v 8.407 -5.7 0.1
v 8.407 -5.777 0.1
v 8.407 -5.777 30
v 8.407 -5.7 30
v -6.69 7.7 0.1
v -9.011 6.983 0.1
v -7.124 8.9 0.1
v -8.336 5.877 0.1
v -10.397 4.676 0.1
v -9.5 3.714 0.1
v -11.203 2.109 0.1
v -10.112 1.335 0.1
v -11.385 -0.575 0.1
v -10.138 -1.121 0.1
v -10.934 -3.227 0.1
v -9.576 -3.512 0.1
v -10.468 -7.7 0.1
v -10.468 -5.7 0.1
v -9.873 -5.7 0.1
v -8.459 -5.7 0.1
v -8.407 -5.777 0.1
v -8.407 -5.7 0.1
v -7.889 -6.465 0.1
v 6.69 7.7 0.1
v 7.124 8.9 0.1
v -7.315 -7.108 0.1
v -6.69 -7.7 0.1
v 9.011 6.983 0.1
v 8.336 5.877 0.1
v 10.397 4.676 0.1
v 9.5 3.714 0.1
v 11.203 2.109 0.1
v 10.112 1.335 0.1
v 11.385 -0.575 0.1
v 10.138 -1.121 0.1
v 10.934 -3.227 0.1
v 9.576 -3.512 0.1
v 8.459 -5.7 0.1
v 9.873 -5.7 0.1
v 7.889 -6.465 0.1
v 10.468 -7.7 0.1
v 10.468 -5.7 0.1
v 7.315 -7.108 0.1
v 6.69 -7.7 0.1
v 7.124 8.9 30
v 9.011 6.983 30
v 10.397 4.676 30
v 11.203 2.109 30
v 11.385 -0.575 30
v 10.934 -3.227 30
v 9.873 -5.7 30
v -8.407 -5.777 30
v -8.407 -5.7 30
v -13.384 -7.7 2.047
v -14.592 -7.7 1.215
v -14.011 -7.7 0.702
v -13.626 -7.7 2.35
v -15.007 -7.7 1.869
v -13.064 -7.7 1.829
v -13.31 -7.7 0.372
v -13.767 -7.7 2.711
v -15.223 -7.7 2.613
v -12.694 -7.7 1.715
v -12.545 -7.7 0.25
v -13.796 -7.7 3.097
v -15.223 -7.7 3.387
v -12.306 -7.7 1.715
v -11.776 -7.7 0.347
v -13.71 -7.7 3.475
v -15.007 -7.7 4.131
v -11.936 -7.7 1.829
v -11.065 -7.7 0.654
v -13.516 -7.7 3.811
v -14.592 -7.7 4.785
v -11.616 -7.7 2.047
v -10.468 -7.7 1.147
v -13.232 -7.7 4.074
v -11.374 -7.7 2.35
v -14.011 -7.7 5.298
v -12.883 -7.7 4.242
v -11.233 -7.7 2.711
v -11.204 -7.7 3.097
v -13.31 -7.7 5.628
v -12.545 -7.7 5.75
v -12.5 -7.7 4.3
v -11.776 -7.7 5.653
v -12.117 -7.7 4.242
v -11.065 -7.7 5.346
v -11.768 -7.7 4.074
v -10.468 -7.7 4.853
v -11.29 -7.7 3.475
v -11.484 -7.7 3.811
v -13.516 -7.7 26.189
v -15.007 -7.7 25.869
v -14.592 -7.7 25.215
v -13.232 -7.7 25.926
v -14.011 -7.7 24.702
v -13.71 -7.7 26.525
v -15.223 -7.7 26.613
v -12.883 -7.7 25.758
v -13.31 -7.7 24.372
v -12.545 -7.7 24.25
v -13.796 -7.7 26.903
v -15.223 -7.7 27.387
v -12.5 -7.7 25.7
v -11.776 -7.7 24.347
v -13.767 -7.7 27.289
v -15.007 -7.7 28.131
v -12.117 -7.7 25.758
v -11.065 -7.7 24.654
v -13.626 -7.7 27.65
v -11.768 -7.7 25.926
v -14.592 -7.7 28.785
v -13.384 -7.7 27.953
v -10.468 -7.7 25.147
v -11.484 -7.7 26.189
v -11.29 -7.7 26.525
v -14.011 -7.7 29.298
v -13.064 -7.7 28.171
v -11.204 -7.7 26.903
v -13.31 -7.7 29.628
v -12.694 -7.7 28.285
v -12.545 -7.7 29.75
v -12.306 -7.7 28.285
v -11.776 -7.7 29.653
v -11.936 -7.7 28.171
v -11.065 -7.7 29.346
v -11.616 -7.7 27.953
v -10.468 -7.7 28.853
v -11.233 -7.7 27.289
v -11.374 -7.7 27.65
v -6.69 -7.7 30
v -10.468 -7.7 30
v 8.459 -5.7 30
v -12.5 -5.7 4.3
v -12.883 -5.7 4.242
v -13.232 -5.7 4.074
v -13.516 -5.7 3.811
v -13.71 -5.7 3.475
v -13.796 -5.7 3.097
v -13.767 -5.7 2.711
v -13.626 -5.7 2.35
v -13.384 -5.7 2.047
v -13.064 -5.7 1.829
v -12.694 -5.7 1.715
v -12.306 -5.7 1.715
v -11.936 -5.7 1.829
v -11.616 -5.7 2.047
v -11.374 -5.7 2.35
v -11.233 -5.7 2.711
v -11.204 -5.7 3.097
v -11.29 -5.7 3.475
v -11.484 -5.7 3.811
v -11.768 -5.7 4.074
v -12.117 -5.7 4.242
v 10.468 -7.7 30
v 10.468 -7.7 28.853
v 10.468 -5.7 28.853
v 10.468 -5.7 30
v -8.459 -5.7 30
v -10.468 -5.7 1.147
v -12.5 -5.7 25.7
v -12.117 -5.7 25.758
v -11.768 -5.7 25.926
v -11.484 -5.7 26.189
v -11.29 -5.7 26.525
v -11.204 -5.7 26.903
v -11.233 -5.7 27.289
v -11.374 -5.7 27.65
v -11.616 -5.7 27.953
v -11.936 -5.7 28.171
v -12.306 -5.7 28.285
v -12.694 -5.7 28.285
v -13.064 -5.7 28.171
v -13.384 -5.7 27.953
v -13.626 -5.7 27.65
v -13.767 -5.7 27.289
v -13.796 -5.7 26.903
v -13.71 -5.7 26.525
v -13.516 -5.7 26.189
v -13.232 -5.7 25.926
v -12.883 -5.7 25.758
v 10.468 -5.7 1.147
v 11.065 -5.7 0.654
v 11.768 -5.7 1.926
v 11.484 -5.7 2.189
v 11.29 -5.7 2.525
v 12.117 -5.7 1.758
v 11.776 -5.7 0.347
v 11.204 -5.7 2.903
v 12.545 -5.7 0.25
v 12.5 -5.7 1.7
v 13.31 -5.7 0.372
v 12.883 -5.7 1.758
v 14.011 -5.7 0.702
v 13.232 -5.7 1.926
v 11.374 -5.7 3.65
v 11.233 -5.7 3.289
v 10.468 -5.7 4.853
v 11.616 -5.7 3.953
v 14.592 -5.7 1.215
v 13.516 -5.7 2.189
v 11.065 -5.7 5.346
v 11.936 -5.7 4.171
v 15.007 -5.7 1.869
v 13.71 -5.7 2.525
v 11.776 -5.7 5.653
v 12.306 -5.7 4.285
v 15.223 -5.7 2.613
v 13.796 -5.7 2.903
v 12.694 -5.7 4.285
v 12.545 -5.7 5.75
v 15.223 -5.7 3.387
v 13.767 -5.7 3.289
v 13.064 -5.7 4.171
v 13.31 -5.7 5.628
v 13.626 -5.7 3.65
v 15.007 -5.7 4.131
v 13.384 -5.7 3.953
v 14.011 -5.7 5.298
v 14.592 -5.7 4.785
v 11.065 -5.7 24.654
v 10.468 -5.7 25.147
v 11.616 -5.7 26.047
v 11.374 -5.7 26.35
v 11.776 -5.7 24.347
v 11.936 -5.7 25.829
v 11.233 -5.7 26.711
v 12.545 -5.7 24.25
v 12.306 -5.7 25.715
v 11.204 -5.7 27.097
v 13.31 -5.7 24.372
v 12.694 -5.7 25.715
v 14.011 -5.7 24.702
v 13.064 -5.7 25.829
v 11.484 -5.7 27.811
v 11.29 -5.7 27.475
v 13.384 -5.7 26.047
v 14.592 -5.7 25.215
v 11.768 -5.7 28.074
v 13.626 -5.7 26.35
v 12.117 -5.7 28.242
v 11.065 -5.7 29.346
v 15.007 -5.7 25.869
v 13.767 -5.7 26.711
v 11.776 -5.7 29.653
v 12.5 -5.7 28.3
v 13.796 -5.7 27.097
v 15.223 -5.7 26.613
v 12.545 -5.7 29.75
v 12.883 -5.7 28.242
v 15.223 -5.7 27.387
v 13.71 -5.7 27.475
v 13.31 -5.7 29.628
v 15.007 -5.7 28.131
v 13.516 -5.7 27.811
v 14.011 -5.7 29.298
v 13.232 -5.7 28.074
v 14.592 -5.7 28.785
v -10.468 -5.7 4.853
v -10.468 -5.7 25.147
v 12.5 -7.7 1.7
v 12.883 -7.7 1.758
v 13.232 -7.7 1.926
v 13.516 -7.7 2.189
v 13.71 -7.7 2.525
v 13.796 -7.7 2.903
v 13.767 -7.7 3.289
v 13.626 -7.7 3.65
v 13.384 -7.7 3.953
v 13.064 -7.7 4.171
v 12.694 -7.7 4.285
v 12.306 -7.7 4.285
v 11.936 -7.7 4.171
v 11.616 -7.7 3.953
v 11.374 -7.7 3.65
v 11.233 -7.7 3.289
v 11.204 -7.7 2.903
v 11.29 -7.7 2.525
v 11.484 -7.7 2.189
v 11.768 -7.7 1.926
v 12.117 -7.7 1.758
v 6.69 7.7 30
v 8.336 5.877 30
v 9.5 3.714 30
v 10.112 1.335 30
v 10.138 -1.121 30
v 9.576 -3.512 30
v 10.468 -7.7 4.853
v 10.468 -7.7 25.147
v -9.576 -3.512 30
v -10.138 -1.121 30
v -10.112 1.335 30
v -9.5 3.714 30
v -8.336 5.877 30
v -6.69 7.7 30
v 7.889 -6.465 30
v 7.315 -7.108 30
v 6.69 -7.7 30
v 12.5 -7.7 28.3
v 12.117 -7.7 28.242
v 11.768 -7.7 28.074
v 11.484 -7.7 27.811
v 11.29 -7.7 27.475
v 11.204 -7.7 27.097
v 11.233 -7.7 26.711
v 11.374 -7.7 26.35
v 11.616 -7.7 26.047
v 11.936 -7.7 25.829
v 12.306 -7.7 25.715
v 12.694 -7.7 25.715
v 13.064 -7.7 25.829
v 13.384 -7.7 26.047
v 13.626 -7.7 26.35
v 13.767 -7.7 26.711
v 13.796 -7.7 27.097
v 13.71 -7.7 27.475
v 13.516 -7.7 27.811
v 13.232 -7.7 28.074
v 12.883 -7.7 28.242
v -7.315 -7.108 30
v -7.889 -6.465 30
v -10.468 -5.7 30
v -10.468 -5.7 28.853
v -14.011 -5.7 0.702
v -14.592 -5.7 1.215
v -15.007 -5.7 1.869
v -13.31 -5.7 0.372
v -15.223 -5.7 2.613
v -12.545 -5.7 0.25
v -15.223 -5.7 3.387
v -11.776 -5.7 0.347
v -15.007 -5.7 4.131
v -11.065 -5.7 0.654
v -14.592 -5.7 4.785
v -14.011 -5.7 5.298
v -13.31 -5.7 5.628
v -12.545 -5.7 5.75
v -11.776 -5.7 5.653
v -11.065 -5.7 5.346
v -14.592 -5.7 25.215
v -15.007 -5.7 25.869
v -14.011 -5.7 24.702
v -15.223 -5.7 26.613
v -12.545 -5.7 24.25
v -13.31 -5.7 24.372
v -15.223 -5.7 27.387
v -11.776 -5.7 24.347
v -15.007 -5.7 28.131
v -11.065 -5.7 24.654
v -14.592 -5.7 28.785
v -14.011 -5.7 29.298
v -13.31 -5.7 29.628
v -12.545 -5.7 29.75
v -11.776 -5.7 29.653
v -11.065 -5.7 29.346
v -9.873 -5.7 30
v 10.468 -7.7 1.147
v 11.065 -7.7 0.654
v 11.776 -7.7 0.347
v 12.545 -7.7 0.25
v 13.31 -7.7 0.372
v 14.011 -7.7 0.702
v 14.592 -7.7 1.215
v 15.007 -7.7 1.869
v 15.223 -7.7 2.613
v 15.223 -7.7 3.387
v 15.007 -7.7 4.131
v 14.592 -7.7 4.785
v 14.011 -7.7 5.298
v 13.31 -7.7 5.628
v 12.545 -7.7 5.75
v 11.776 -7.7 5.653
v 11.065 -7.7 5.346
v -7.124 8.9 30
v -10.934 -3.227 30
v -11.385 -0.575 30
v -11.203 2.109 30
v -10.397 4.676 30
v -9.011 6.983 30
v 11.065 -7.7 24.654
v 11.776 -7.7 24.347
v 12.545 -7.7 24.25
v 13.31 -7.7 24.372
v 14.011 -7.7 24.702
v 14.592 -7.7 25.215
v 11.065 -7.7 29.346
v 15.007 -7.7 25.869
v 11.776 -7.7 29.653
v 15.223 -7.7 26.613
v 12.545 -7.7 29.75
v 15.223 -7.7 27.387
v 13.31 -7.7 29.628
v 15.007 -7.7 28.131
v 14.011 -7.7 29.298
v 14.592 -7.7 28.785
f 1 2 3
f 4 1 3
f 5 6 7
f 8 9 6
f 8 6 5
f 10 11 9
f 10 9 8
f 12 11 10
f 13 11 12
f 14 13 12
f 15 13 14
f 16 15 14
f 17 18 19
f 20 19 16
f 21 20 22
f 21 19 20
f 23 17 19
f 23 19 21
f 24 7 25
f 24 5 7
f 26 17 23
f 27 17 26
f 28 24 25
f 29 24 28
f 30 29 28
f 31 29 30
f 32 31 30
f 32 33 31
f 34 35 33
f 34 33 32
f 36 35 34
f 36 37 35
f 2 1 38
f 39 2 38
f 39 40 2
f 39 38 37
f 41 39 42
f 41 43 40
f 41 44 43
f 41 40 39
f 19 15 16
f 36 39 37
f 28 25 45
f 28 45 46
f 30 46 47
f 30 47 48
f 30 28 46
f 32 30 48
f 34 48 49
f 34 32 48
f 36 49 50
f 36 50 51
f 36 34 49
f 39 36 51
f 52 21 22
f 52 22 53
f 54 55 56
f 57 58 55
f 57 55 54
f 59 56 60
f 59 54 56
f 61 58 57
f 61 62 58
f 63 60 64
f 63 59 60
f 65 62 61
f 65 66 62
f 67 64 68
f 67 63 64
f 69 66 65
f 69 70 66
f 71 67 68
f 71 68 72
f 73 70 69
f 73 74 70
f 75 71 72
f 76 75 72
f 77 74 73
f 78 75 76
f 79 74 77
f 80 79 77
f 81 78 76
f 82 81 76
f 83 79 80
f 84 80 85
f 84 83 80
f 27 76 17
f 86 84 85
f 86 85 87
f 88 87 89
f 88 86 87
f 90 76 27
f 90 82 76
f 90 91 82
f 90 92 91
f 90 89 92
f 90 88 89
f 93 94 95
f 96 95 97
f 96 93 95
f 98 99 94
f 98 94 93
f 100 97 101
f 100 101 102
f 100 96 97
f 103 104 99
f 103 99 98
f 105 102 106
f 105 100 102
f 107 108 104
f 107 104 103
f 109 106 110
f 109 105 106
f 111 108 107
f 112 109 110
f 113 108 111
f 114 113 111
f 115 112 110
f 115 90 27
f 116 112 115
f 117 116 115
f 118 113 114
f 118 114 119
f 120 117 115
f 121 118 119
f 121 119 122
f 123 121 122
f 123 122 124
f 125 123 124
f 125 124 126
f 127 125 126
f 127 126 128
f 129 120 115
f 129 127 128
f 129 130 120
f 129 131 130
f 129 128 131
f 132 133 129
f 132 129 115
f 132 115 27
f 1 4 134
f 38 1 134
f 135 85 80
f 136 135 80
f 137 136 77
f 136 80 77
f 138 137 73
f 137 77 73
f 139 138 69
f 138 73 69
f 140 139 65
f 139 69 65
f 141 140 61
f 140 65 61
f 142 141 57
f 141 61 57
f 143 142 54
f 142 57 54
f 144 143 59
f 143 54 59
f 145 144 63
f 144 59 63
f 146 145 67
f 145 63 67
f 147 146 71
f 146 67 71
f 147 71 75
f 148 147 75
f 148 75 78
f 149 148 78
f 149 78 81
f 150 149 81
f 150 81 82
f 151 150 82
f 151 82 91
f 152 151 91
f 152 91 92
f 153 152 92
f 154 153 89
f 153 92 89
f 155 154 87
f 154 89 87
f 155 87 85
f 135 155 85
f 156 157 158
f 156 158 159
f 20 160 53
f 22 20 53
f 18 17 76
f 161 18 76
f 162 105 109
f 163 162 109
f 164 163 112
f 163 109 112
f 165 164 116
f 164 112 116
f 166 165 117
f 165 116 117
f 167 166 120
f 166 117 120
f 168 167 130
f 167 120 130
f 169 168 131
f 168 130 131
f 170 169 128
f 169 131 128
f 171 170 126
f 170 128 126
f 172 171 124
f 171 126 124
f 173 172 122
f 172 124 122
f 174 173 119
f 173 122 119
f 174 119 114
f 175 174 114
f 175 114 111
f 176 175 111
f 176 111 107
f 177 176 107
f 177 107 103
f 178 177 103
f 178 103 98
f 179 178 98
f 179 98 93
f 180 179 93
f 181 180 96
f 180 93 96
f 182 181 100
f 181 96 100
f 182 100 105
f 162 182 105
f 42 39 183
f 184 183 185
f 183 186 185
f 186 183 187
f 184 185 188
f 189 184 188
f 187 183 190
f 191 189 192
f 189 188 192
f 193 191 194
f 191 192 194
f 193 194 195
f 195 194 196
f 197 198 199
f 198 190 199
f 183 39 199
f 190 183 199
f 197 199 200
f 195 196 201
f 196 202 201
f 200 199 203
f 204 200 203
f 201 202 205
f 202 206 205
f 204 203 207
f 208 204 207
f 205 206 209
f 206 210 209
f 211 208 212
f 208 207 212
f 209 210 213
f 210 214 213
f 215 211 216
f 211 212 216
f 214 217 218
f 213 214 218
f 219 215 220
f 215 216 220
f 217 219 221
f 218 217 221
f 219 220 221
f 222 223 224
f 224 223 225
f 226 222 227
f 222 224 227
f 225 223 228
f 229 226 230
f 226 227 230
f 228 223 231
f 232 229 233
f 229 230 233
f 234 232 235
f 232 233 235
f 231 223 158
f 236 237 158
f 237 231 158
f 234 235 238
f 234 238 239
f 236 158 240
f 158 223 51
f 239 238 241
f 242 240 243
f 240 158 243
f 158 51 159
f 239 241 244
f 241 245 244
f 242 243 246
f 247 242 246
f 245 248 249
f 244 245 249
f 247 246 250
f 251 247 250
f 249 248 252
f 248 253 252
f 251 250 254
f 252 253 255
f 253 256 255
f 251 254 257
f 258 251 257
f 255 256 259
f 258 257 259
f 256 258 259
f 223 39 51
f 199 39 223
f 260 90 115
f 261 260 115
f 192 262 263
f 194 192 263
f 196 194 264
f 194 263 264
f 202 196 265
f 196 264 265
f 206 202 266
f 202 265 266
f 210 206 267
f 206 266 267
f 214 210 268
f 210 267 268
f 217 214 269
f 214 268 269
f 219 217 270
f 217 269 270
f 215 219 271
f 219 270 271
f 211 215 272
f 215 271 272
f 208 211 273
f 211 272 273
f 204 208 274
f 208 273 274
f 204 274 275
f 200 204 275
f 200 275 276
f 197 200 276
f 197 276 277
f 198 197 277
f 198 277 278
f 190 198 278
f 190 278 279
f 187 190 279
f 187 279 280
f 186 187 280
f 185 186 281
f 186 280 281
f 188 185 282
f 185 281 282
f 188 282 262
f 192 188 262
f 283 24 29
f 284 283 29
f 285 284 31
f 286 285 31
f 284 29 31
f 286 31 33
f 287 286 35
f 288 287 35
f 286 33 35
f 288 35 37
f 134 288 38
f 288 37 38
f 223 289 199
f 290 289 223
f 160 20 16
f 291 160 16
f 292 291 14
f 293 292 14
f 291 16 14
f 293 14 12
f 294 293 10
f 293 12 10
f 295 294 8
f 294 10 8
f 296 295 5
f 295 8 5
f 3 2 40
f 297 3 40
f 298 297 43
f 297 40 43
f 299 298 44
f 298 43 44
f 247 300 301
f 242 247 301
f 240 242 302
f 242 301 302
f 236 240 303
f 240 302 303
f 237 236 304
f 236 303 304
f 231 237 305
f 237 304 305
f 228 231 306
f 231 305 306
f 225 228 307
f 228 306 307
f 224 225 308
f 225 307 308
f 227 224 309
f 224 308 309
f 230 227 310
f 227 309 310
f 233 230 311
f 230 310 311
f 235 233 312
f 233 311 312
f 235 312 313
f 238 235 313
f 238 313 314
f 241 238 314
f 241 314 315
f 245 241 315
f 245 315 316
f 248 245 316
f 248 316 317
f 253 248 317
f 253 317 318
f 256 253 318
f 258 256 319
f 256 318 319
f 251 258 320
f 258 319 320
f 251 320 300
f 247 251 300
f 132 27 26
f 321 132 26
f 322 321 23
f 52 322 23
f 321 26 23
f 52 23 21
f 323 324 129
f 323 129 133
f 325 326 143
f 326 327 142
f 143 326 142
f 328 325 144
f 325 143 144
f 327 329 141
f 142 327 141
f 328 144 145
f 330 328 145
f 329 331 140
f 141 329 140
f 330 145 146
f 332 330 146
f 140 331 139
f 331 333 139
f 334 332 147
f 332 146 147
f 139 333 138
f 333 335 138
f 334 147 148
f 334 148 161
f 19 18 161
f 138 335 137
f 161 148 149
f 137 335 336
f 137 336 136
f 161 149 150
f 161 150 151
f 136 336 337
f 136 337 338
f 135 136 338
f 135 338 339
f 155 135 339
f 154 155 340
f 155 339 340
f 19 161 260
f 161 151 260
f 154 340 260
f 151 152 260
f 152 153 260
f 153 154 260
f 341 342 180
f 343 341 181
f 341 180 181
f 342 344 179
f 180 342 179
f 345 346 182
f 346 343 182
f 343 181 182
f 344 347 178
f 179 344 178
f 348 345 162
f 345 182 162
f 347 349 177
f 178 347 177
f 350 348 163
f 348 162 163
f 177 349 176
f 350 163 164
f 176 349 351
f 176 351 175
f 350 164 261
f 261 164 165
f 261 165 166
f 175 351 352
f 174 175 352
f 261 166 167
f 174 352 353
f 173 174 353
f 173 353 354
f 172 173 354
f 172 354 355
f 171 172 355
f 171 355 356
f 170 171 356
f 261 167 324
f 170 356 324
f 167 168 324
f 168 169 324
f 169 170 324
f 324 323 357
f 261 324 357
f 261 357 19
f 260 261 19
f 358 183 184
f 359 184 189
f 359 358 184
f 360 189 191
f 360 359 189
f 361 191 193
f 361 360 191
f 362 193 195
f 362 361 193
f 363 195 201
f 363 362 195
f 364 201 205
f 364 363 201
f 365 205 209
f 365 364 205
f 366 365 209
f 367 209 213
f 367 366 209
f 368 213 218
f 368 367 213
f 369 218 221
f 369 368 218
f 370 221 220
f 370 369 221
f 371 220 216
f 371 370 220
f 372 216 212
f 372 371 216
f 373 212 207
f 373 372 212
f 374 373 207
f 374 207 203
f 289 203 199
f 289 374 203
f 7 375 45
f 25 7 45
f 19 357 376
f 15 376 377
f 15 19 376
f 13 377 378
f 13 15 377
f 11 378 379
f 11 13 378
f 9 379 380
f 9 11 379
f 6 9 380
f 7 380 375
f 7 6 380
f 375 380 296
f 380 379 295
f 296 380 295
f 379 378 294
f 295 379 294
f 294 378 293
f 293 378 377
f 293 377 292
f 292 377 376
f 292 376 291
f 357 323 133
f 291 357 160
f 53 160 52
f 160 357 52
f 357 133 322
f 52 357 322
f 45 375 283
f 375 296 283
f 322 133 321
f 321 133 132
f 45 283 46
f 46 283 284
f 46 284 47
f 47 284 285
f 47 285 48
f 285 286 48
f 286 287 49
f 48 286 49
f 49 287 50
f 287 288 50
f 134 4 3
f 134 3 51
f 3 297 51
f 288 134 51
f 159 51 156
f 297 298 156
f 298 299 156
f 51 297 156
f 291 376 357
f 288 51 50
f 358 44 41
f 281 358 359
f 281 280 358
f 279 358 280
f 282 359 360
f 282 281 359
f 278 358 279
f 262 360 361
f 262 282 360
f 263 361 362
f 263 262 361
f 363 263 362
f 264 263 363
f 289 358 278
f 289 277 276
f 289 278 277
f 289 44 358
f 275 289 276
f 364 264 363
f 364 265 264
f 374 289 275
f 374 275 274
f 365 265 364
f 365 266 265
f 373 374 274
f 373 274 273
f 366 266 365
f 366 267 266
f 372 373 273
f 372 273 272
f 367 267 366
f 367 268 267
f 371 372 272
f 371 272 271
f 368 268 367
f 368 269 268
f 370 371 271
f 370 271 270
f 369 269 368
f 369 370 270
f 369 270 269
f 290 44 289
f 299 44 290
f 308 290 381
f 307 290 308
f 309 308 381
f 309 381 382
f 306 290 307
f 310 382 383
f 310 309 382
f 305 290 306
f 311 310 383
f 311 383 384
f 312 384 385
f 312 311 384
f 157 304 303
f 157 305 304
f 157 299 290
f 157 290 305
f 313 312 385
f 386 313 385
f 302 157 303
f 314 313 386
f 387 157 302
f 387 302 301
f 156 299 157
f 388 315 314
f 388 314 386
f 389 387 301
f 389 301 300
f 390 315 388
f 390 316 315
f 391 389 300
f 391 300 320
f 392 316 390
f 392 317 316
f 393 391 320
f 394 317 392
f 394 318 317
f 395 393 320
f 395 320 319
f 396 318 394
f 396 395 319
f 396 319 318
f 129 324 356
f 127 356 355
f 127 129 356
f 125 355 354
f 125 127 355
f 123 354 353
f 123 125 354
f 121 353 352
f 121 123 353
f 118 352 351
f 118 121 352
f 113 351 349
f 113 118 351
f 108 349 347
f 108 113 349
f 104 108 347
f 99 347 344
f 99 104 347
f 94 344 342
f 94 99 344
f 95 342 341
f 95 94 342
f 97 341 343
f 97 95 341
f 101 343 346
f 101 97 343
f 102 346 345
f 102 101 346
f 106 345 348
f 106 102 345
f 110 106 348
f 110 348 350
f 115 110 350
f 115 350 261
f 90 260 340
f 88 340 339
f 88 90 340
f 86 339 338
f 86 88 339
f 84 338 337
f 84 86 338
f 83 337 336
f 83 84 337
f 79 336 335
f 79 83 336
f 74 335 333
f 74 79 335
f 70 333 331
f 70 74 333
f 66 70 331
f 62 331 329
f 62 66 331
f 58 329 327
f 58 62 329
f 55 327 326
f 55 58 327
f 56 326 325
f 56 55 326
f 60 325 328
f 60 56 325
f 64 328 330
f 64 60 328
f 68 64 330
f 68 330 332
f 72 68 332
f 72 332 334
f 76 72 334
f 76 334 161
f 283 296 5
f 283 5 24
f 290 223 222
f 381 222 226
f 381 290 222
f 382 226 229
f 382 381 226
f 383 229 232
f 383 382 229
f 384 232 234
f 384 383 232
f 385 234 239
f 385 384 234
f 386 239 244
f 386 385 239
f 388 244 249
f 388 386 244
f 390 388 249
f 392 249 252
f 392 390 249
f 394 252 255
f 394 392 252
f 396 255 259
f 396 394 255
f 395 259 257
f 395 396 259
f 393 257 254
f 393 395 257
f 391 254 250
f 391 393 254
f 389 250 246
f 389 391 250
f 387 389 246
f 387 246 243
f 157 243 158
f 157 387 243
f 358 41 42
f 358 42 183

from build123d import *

# Parameters (mm, degrees)
SALIENTE_EXTRUIR1_DEPTH   = 30
VACIADO1_T                = 1.2
CROQUIS2_W                = 41.64599518
CROQUIS2_H                = 31.401201606
CORTAR_EXTRUIR1_DEPTH     = 1.3
CROQUIS3_W                = 19.002401527
CROQUIS3_H                = 2.972205444
CORTAR_EXTRUIR2_DEPTH     = 48.3
CROQUIS4_R                = 2.75
CROQUIS4_R_2              = 1.3
SALIENTE_EXTRUIR2_DEPTH   = 2
SALIENTE_EXTRUIR2_2_DEPTH = 2
SALIENTE_EXTRUIR2_3_DEPTH = 2
SALIENTE_EXTRUIR2_4_DEPTH = 2
CROQUIS5_W                = 2.061100057
CROQUIS5_H                = 29.9
SALIENTE_EXTRUIR3_DEPTH   = 2


with BuildPart() as part:
    # Croquis1 → Saliente-Extruir1 (new body)
    with BuildSketch(Plane.XY):
        with BuildLine():
            Line((-6.68954408, 7.7), (6.68954408, 7.7))
            ThreePointArc((6.68954408, 7.7), (10.2, 0), (6.68954408, -7.7))
            Line((6.68954408, -7.7), (-6.68954408, -7.7))
            ThreePointArc((-6.68954408, -7.7), (-10.2, 0), (-6.68954408, 7.7))
        make_face()
    extrude(amount=SALIENTE_EXTRUIR1_DEPTH)

    # Vaciado1
    vaciado1_openings = [part.faces().sort_by_distance(p)[0] for p in [
        (0, 0, 30),
    ]]
    offset(amount=VACIADO1_T, openings=vaciado1_openings, kind=Kind.INTERSECTION)

    # Croquis2 → Cortar-Extruir1 (cut)
    with BuildSketch(Plane(origin=(0, 0, -1.2), x_dir=(-1, 0, 0), z_dir=(0, 0, -1))):
        Rectangle(CROQUIS2_W, CROQUIS2_H)
    extrude(amount=-CORTAR_EXTRUIR1_DEPTH, mode=Mode.SUBTRACT)

    # Croquis3 → Cortar-Extruir2 (cut)
    with BuildSketch(Plane.XY.offset(30)):
        with Locations((-0.191367802, -9.186102722)):
            Rectangle(CROQUIS3_W, CROQUIS3_H)
    extrude(amount=-CORTAR_EXTRUIR2_DEPTH, mode=Mode.SUBTRACT)



with BuildPart() as body_2:
    # Croquis4 → Saliente-Extruir2 (new body)
    with BuildSketch(Plane.XZ.offset(7.7)):
        with Locations(Location((12.5, 3, 0), (0, 0, 270))):
            Circle(CROQUIS4_R)
        with Locations(Location((12.5, 3, 0), (0, 0, 270))):
            Circle(CROQUIS4_R_2, mode=Mode.SUBTRACT)
    extrude(amount=-SALIENTE_EXTRUIR2_DEPTH)


with BuildPart() as body_3:
    # Croquis4 → Saliente-Extruir2 2 (new body)
    with BuildSketch(Plane.XZ.offset(7.7)):
        with Locations(Location((12.5, 27, 0), (0, 0, 90))):
            Circle(CROQUIS4_R)
        with Locations(Location((12.5, 27, 0), (0, 0, 90))):
            Circle(CROQUIS4_R_2, mode=Mode.SUBTRACT)
    extrude(amount=-SALIENTE_EXTRUIR2_2_DEPTH)


with BuildPart() as body_4:
    # Croquis4 → Saliente-Extruir2 3 (new body)
    with BuildSketch(Plane.XZ.offset(7.7)):
        with Locations(Location((-12.5, 27, 0), (0, 0, 270))):
            Circle(CROQUIS4_R)
        with Locations(Location((-12.5, 27, 0), (0, 0, 270))):
            Circle(CROQUIS4_R_2, mode=Mode.SUBTRACT)
    extrude(amount=-SALIENTE_EXTRUIR2_3_DEPTH)


with BuildPart() as body_5:
    # Croquis4 → Saliente-Extruir2 4 (new body)
    with BuildSketch(Plane.XZ.offset(7.7)):
        with Locations(Location((-12.5, 3, 0), (0, 0, 90))):
            Circle(CROQUIS4_R)
        with Locations(Location((-12.5, 3, 0), (0, 0, 90))):
            Circle(CROQUIS4_R_2, mode=Mode.SUBTRACT)
    extrude(amount=-SALIENTE_EXTRUIR2_4_DEPTH)


with BuildPart() as part_1:
    add(part.part)

    add(body_2.part)  # Saliente-Extruir3 merges body 2

    add(body_3.part)  # Saliente-Extruir3 merges body 3

    add(body_4.part)  # Saliente-Extruir3 merges body 4

    add(body_5.part)  # Saliente-Extruir3 merges body 5
    # Croquis5 → Saliente-Extruir3 (add)
    with BuildSketch(Plane.XZ.offset(7.7)):
        with Locations((-9.437095098, 15.05)):
            Rectangle(CROQUIS5_W, CROQUIS5_H)
        with Locations((9.437095098, 15.05)):
            Rectangle(CROQUIS5_W, CROQUIS5_H)
    extrude(amount=-SALIENTE_EXTRUIR3_DEPTH)


solid = part_1.part
